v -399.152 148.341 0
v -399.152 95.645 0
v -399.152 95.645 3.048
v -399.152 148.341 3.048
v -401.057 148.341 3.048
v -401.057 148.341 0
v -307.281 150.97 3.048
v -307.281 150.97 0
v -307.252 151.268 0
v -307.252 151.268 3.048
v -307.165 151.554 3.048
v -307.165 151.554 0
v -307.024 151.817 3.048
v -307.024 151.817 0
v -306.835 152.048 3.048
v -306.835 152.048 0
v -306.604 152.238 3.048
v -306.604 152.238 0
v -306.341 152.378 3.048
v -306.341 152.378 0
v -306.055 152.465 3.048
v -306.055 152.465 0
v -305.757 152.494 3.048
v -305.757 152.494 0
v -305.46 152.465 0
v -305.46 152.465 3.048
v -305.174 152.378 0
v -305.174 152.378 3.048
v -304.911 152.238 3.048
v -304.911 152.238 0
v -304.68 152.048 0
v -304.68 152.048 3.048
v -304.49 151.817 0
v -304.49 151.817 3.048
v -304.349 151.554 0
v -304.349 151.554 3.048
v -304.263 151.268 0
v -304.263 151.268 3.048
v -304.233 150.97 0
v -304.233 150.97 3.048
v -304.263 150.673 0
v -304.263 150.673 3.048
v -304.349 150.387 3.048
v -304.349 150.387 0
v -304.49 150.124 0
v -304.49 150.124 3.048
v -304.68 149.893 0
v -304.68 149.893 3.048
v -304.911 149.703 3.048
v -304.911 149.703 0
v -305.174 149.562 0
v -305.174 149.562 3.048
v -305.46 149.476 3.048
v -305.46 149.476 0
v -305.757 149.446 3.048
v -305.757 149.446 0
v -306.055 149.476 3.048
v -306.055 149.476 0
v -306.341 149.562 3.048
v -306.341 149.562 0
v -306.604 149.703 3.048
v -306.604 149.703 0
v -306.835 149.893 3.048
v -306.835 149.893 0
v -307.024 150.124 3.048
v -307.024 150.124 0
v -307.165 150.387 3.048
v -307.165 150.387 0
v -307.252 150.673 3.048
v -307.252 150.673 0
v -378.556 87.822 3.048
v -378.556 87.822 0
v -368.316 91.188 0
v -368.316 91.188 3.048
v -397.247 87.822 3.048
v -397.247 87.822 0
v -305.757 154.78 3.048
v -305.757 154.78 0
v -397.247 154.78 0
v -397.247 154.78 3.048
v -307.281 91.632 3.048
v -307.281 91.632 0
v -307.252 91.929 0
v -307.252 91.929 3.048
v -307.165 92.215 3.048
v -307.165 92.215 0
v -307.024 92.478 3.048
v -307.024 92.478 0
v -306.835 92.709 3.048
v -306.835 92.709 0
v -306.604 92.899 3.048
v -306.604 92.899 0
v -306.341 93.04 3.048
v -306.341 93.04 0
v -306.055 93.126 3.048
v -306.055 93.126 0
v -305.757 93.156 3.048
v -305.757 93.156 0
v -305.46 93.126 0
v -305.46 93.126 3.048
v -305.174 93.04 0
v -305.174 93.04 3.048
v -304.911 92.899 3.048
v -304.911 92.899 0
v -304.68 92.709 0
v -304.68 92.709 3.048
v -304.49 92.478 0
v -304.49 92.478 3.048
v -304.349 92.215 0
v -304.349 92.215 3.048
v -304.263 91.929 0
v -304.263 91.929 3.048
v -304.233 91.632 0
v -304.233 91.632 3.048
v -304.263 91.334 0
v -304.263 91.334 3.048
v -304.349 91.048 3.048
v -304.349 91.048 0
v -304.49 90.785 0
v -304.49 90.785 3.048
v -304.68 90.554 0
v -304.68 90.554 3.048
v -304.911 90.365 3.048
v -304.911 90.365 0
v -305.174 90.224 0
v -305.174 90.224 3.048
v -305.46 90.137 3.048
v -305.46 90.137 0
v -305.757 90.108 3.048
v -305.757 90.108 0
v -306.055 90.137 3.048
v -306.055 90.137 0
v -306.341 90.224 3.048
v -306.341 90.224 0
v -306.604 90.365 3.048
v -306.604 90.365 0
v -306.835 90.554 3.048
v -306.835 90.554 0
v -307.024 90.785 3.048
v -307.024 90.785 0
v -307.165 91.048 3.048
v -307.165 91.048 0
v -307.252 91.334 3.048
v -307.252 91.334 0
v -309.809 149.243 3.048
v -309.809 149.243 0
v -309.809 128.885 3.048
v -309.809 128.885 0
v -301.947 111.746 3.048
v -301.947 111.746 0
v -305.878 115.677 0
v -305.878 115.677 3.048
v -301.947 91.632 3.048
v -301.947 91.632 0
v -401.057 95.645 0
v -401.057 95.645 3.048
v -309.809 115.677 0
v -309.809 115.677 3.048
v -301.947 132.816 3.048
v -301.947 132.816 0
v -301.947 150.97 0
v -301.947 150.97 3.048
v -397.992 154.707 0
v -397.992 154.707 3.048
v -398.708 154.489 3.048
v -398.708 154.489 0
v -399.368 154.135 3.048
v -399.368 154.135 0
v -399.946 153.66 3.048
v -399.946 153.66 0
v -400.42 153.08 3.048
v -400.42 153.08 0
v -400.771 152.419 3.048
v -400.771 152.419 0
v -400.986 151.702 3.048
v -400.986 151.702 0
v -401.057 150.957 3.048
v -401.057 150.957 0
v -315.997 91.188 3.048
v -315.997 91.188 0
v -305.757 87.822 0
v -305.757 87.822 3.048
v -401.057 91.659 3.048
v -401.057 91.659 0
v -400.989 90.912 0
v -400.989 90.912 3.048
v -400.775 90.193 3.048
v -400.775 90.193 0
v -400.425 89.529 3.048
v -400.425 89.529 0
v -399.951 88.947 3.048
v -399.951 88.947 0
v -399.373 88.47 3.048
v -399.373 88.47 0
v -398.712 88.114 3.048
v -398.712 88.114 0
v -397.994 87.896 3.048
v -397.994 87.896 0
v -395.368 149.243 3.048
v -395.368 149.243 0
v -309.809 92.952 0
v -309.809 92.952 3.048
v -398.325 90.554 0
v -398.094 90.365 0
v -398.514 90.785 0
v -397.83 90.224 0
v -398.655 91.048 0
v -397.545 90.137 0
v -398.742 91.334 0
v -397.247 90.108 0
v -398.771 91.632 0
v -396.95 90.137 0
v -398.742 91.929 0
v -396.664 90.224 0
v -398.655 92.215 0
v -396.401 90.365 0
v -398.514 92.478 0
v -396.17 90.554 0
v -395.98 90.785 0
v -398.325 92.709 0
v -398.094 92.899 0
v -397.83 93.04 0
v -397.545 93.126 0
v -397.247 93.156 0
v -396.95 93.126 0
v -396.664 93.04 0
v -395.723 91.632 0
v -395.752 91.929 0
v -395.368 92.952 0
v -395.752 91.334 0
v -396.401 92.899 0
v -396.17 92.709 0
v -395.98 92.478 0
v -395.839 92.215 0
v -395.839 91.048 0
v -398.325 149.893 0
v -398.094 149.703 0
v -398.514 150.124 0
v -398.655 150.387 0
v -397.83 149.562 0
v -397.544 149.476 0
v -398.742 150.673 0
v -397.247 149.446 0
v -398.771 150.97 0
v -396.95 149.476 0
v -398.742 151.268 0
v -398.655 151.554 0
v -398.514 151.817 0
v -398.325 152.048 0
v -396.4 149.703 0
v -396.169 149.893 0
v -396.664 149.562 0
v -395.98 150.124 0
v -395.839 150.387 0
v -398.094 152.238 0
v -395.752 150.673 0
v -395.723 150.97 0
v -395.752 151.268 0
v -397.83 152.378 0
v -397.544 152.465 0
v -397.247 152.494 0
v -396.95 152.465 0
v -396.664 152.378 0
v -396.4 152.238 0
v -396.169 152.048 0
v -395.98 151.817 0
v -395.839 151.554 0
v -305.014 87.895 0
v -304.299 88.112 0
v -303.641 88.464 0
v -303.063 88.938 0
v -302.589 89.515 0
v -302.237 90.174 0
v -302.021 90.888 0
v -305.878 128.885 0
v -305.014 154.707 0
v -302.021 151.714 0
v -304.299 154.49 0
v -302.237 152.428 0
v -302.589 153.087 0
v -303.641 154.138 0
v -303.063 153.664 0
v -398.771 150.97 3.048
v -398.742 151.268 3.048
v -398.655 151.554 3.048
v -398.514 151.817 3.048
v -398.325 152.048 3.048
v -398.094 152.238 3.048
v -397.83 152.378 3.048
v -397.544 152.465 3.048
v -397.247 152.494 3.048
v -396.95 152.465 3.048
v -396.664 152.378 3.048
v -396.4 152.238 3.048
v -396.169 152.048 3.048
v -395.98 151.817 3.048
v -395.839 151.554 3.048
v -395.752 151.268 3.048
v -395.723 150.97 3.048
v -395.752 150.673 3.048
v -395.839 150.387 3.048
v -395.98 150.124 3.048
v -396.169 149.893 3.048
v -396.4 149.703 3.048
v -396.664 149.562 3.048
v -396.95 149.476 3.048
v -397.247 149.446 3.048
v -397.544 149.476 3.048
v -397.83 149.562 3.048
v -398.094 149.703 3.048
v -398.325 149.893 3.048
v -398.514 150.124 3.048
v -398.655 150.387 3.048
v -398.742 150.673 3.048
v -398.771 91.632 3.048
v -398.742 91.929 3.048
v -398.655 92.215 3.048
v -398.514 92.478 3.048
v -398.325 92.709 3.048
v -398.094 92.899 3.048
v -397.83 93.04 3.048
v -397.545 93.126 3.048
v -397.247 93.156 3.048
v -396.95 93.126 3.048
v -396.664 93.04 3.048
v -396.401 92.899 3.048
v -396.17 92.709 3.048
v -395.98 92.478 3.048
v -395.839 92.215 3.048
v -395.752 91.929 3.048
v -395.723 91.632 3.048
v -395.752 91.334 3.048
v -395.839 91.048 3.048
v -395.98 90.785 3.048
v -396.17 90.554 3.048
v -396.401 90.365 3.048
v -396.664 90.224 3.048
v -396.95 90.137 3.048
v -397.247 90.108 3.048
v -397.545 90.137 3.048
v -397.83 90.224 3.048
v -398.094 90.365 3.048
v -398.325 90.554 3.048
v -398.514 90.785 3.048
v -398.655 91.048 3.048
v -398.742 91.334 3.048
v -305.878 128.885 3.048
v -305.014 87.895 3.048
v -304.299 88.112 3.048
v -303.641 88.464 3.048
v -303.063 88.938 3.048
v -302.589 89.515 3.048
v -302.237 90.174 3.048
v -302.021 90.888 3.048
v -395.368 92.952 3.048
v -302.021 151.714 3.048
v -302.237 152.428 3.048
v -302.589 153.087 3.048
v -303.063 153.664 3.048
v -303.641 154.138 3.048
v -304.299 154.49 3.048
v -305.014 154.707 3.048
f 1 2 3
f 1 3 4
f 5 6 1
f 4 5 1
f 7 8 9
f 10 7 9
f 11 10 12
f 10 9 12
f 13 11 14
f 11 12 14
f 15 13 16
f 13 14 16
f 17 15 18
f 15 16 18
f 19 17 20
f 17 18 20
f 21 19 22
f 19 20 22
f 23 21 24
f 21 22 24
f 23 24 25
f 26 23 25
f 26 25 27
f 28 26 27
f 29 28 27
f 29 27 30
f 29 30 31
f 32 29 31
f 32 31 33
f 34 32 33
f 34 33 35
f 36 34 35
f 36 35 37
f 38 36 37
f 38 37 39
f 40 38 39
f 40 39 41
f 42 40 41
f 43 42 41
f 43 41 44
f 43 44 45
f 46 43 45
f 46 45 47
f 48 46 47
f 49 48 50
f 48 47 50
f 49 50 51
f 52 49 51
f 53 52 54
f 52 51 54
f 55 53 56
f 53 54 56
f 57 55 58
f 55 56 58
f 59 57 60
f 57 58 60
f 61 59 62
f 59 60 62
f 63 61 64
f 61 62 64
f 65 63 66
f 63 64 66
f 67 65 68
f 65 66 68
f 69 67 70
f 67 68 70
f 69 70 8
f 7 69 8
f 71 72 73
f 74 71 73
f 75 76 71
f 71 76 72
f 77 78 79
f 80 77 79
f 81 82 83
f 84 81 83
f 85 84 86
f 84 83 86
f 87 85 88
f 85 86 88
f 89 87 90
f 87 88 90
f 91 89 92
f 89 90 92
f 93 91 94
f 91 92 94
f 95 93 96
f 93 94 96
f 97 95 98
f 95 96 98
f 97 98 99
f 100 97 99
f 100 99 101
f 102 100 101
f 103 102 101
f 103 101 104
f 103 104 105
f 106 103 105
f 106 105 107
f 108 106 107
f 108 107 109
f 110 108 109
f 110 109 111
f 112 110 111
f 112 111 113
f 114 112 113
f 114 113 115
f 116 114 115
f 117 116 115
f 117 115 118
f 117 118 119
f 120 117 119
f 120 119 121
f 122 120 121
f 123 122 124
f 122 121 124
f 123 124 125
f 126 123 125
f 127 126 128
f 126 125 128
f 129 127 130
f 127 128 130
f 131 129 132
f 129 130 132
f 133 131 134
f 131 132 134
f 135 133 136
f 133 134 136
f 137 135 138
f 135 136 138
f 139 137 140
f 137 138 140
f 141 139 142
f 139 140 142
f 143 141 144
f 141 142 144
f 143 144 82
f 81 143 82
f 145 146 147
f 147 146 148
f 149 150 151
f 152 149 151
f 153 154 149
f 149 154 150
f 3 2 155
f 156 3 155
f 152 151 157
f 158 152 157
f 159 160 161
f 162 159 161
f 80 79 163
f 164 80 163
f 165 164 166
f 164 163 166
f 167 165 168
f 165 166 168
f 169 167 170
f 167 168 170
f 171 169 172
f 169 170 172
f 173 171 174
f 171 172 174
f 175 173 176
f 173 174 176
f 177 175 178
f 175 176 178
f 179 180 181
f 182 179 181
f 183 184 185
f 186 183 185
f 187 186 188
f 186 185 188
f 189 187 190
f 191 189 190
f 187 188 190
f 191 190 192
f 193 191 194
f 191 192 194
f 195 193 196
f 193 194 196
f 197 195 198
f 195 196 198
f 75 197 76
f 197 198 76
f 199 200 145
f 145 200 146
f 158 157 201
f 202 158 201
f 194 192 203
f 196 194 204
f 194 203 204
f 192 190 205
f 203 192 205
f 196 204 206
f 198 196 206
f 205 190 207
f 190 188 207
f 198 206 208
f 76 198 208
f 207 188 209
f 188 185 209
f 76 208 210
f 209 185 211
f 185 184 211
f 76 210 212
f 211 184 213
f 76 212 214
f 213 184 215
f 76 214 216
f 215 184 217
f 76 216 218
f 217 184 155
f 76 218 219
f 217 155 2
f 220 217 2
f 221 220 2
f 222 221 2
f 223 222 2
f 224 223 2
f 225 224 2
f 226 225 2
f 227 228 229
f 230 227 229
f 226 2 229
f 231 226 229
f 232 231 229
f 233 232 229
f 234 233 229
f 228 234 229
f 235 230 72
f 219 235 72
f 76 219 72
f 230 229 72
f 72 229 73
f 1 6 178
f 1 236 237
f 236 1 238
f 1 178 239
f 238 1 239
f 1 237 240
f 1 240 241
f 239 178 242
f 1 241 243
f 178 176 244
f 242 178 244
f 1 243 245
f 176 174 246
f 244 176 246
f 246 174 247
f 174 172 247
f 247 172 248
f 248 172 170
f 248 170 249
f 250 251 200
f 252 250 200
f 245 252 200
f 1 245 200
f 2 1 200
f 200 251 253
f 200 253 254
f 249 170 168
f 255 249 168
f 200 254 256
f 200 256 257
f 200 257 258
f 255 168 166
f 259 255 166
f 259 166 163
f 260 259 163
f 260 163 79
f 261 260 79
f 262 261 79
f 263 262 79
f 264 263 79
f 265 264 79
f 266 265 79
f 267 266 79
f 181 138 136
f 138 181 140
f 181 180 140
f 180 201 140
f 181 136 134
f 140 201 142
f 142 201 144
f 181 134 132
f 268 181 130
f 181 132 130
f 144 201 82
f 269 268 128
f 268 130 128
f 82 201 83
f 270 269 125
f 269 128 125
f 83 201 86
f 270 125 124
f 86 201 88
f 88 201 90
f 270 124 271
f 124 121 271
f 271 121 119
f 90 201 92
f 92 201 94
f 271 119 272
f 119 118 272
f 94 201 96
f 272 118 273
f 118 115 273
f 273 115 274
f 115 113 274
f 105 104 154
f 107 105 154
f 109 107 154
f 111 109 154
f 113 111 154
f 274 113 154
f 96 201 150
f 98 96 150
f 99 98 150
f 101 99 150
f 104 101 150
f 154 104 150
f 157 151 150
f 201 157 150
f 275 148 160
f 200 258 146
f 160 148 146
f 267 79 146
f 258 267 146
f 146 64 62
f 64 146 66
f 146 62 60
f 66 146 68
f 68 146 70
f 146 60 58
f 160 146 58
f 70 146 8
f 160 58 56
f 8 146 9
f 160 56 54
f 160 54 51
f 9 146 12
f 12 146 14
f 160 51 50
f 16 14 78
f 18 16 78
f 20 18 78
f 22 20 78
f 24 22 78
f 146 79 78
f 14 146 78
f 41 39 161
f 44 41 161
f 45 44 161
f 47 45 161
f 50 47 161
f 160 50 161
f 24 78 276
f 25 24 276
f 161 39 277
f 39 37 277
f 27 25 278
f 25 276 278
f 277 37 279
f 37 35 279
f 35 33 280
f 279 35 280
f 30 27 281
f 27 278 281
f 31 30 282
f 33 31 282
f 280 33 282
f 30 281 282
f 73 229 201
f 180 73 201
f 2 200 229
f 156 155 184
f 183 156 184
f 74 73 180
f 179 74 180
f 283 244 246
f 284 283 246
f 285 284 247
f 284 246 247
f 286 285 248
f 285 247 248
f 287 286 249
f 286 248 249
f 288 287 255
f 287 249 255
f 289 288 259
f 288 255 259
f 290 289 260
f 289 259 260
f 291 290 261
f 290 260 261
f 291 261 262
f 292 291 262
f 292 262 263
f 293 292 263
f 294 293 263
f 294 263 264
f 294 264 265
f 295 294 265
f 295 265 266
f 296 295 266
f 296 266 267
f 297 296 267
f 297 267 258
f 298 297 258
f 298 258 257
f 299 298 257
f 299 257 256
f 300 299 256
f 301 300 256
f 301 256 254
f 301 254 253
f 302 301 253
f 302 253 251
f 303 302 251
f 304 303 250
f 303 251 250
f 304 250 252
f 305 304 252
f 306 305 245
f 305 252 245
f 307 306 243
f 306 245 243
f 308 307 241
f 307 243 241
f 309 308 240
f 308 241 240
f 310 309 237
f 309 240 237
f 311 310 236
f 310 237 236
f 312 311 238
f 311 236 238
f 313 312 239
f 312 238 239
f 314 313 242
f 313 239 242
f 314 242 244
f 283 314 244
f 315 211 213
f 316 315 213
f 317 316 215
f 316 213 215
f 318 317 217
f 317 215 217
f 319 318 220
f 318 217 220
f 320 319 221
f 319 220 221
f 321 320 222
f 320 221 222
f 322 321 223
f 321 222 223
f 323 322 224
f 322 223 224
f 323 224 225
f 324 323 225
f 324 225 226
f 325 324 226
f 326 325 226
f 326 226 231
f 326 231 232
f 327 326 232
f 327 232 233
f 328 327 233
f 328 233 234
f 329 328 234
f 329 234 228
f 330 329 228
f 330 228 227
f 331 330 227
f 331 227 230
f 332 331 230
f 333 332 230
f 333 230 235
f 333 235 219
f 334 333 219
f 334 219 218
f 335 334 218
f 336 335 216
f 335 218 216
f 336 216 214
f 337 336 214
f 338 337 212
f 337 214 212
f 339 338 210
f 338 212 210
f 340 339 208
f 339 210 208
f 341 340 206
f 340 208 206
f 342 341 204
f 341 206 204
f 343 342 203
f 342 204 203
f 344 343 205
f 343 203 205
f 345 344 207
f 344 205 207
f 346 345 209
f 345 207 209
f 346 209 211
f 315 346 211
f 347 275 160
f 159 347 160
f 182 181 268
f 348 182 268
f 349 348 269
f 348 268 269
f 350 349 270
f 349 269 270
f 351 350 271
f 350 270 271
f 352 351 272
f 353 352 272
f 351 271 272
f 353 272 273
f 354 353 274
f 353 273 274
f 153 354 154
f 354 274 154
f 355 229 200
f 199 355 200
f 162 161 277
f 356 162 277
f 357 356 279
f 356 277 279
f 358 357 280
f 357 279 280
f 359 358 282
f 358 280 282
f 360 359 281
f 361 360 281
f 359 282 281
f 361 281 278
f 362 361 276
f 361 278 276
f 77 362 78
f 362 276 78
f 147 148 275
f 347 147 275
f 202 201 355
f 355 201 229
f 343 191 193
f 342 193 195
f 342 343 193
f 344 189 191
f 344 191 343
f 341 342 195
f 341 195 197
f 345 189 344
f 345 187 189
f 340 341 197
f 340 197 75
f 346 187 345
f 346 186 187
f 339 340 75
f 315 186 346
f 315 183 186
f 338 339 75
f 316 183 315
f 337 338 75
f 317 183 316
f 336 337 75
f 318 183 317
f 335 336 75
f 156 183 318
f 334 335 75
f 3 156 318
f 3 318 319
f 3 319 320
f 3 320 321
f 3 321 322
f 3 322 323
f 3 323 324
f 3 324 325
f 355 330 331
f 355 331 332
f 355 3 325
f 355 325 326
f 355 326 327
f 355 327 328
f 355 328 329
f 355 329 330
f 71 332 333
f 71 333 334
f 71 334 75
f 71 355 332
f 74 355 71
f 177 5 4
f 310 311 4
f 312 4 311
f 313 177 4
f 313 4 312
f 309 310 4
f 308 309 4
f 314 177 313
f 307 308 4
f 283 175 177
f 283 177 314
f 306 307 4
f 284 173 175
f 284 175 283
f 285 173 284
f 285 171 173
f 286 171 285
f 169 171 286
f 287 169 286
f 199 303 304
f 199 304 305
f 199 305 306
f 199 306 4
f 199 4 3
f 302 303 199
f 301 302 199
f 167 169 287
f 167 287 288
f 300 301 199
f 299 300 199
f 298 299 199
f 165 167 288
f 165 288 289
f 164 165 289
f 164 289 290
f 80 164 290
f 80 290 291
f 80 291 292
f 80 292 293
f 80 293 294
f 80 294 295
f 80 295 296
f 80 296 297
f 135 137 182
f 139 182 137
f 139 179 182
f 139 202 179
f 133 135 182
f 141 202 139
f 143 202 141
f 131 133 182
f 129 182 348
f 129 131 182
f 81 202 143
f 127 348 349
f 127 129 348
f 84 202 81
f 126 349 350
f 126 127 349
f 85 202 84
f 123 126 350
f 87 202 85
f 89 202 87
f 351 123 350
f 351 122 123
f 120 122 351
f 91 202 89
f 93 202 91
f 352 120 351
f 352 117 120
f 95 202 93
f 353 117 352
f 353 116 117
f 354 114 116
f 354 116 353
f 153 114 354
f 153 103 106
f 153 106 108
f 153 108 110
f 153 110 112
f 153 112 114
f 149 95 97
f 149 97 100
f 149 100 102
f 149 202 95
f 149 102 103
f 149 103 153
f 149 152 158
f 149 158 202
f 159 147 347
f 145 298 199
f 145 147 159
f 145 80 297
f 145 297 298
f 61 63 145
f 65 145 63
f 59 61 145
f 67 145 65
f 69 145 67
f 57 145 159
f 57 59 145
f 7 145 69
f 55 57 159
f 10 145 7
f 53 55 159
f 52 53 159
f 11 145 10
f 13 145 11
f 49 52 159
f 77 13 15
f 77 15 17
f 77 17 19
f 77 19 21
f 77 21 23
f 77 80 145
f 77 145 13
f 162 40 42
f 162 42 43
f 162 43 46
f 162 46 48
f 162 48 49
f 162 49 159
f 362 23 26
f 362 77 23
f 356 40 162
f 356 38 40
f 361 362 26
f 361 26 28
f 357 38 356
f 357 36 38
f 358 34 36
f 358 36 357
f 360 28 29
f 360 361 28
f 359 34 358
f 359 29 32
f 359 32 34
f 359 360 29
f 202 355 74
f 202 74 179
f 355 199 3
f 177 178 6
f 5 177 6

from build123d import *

# Parameters (mm, degrees)
SKETCH1_R           = 1.3462
SKETCH1_W           = 3.7846
SKETCH1_H           = 52.6961
BOSS_EXTRUDE1_DEPTH = 3.048
SKETCH2_R           = 1.524
CUT_EXTRUDE1_DEPTH  = 430.898988368


with BuildPart() as part:
    # Sketch1 → Boss-Extrude1 (new body)
    # profile 1 of 3: a face of its own
    with BuildSketch(Plane.XY):
        with BuildLine():
            Line((-401.0571, 150.956597849), (-401.0571, 148.341))
            Line((-401.0571, 148.341), (-399.1521, 148.341))
            Line((-399.1521, 148.341), (-395.3675, 148.341))
            Line((-395.3675, 148.341), (-395.3675, 149.2432))
            Line((-395.3675, 149.2432), (-309.8086, 149.2432))
            Line((-309.8086, 149.2432), (-309.8086, 128.8851))
            Line((-309.8086, 128.8851), (-305.87795, 128.8851))
            Line((-305.87795, 128.8851), (-301.9473, 132.81575))
            Line((-301.9473, 132.81575), (-301.9473, 150.9704))
            ThreePointArc((-301.9473, 150.9704), (-303.063223164, 153.664476836), (-305.7573, 154.7804))
            Line((-305.7573, 154.7804), (-397.247125, 154.7804))
            ThreePointArc((-397.247125, 154.7804), (-399.946077222, 153.659592612), (-401.0571, 150.956597849))
        make_face()
        with Locations(Location((-397.247125, 150.9704, 0), (0, 0, 180))):
            Circle(SKETCH1_R, mode=Mode.SUBTRACT)
        with Locations(Location((-305.7573, 150.9704, 0), (0, 0, 180))):
            Circle(SKETCH1_R, mode=Mode.SUBTRACT)
    # profile 2 of 3: a face of its own
    with BuildSketch(Plane.XY):
        with Locations((-397.2598, 121.99295)):
            Rectangle(SKETCH1_W, SKETCH1_H)
    # profile 3 of 3: a face of its own
    with BuildSketch(Plane.XY):
        with BuildLine():
            Line((-395.3675, 95.6449), (-399.1521, 95.6449))
            Line((-399.1521, 95.6449), (-401.0571, 95.6449))
            Line((-401.0571, 95.6449), (-401.0571, 91.659304166))
            ThreePointArc((-401.0571, 91.659304166), (-399.951018769, 88.947400452), (-397.2472, 87.8217))
            Line((-397.2472, 87.8217), (-378.5565, 87.8217))
            Line((-378.5565, 87.8217), (-368.3165, 91.1883))
            Line((-368.3165, 91.1883), (-315.9973, 91.1883))
            Line((-315.9973, 91.1883), (-305.7573, 87.8217))
            ThreePointArc((-305.7573, 87.8217), (-303.063223164, 88.937623164), (-301.9473, 91.6317))
            Line((-301.9473, 91.6317), (-301.9473, 111.74645))
            Line((-301.9473, 111.74645), (-305.87795, 115.6771))
            Line((-305.87795, 115.6771), (-309.8086, 115.6771))
            Line((-309.8086, 115.6771), (-309.8086, 92.9525))
            Line((-309.8086, 92.9525), (-395.3675, 92.9525))
            Line((-395.3675, 92.9525), (-395.3675, 95.6449))
        make_face()
        with Locations(Location((-397.2472, 91.6317, 0), (0, 0, 180))):
            Circle(SKETCH1_R, mode=Mode.SUBTRACT)
        with Locations(Location((-305.7573, 91.6317, 0), (0, 0, 180))):
            Circle(SKETCH1_R, mode=Mode.SUBTRACT)
    extrude(amount=BOSS_EXTRUDE1_DEPTH)

    # Sketch2 → Cut-Extrude1 (cut, through all)
    with BuildSketch(Plane(origin=(0, 0, 0), x_dir=(-1, 0, 0), z_dir=(0, 0, -1))):
        with Locations((305.7573, 150.9704)):
            Circle(SKETCH2_R)
        with Locations((305.7573, 91.6317)):
            Circle(SKETCH2_R)
        with Locations((397.2472, 91.6317)):
            Circle(SKETCH2_R)
        with Locations((397.247125, 150.9704)):
            Circle(SKETCH2_R)
    extrude(amount=-CUT_EXTRUDE1_DEPTH, mode=Mode.SUBTRACT)


solid = part.part
